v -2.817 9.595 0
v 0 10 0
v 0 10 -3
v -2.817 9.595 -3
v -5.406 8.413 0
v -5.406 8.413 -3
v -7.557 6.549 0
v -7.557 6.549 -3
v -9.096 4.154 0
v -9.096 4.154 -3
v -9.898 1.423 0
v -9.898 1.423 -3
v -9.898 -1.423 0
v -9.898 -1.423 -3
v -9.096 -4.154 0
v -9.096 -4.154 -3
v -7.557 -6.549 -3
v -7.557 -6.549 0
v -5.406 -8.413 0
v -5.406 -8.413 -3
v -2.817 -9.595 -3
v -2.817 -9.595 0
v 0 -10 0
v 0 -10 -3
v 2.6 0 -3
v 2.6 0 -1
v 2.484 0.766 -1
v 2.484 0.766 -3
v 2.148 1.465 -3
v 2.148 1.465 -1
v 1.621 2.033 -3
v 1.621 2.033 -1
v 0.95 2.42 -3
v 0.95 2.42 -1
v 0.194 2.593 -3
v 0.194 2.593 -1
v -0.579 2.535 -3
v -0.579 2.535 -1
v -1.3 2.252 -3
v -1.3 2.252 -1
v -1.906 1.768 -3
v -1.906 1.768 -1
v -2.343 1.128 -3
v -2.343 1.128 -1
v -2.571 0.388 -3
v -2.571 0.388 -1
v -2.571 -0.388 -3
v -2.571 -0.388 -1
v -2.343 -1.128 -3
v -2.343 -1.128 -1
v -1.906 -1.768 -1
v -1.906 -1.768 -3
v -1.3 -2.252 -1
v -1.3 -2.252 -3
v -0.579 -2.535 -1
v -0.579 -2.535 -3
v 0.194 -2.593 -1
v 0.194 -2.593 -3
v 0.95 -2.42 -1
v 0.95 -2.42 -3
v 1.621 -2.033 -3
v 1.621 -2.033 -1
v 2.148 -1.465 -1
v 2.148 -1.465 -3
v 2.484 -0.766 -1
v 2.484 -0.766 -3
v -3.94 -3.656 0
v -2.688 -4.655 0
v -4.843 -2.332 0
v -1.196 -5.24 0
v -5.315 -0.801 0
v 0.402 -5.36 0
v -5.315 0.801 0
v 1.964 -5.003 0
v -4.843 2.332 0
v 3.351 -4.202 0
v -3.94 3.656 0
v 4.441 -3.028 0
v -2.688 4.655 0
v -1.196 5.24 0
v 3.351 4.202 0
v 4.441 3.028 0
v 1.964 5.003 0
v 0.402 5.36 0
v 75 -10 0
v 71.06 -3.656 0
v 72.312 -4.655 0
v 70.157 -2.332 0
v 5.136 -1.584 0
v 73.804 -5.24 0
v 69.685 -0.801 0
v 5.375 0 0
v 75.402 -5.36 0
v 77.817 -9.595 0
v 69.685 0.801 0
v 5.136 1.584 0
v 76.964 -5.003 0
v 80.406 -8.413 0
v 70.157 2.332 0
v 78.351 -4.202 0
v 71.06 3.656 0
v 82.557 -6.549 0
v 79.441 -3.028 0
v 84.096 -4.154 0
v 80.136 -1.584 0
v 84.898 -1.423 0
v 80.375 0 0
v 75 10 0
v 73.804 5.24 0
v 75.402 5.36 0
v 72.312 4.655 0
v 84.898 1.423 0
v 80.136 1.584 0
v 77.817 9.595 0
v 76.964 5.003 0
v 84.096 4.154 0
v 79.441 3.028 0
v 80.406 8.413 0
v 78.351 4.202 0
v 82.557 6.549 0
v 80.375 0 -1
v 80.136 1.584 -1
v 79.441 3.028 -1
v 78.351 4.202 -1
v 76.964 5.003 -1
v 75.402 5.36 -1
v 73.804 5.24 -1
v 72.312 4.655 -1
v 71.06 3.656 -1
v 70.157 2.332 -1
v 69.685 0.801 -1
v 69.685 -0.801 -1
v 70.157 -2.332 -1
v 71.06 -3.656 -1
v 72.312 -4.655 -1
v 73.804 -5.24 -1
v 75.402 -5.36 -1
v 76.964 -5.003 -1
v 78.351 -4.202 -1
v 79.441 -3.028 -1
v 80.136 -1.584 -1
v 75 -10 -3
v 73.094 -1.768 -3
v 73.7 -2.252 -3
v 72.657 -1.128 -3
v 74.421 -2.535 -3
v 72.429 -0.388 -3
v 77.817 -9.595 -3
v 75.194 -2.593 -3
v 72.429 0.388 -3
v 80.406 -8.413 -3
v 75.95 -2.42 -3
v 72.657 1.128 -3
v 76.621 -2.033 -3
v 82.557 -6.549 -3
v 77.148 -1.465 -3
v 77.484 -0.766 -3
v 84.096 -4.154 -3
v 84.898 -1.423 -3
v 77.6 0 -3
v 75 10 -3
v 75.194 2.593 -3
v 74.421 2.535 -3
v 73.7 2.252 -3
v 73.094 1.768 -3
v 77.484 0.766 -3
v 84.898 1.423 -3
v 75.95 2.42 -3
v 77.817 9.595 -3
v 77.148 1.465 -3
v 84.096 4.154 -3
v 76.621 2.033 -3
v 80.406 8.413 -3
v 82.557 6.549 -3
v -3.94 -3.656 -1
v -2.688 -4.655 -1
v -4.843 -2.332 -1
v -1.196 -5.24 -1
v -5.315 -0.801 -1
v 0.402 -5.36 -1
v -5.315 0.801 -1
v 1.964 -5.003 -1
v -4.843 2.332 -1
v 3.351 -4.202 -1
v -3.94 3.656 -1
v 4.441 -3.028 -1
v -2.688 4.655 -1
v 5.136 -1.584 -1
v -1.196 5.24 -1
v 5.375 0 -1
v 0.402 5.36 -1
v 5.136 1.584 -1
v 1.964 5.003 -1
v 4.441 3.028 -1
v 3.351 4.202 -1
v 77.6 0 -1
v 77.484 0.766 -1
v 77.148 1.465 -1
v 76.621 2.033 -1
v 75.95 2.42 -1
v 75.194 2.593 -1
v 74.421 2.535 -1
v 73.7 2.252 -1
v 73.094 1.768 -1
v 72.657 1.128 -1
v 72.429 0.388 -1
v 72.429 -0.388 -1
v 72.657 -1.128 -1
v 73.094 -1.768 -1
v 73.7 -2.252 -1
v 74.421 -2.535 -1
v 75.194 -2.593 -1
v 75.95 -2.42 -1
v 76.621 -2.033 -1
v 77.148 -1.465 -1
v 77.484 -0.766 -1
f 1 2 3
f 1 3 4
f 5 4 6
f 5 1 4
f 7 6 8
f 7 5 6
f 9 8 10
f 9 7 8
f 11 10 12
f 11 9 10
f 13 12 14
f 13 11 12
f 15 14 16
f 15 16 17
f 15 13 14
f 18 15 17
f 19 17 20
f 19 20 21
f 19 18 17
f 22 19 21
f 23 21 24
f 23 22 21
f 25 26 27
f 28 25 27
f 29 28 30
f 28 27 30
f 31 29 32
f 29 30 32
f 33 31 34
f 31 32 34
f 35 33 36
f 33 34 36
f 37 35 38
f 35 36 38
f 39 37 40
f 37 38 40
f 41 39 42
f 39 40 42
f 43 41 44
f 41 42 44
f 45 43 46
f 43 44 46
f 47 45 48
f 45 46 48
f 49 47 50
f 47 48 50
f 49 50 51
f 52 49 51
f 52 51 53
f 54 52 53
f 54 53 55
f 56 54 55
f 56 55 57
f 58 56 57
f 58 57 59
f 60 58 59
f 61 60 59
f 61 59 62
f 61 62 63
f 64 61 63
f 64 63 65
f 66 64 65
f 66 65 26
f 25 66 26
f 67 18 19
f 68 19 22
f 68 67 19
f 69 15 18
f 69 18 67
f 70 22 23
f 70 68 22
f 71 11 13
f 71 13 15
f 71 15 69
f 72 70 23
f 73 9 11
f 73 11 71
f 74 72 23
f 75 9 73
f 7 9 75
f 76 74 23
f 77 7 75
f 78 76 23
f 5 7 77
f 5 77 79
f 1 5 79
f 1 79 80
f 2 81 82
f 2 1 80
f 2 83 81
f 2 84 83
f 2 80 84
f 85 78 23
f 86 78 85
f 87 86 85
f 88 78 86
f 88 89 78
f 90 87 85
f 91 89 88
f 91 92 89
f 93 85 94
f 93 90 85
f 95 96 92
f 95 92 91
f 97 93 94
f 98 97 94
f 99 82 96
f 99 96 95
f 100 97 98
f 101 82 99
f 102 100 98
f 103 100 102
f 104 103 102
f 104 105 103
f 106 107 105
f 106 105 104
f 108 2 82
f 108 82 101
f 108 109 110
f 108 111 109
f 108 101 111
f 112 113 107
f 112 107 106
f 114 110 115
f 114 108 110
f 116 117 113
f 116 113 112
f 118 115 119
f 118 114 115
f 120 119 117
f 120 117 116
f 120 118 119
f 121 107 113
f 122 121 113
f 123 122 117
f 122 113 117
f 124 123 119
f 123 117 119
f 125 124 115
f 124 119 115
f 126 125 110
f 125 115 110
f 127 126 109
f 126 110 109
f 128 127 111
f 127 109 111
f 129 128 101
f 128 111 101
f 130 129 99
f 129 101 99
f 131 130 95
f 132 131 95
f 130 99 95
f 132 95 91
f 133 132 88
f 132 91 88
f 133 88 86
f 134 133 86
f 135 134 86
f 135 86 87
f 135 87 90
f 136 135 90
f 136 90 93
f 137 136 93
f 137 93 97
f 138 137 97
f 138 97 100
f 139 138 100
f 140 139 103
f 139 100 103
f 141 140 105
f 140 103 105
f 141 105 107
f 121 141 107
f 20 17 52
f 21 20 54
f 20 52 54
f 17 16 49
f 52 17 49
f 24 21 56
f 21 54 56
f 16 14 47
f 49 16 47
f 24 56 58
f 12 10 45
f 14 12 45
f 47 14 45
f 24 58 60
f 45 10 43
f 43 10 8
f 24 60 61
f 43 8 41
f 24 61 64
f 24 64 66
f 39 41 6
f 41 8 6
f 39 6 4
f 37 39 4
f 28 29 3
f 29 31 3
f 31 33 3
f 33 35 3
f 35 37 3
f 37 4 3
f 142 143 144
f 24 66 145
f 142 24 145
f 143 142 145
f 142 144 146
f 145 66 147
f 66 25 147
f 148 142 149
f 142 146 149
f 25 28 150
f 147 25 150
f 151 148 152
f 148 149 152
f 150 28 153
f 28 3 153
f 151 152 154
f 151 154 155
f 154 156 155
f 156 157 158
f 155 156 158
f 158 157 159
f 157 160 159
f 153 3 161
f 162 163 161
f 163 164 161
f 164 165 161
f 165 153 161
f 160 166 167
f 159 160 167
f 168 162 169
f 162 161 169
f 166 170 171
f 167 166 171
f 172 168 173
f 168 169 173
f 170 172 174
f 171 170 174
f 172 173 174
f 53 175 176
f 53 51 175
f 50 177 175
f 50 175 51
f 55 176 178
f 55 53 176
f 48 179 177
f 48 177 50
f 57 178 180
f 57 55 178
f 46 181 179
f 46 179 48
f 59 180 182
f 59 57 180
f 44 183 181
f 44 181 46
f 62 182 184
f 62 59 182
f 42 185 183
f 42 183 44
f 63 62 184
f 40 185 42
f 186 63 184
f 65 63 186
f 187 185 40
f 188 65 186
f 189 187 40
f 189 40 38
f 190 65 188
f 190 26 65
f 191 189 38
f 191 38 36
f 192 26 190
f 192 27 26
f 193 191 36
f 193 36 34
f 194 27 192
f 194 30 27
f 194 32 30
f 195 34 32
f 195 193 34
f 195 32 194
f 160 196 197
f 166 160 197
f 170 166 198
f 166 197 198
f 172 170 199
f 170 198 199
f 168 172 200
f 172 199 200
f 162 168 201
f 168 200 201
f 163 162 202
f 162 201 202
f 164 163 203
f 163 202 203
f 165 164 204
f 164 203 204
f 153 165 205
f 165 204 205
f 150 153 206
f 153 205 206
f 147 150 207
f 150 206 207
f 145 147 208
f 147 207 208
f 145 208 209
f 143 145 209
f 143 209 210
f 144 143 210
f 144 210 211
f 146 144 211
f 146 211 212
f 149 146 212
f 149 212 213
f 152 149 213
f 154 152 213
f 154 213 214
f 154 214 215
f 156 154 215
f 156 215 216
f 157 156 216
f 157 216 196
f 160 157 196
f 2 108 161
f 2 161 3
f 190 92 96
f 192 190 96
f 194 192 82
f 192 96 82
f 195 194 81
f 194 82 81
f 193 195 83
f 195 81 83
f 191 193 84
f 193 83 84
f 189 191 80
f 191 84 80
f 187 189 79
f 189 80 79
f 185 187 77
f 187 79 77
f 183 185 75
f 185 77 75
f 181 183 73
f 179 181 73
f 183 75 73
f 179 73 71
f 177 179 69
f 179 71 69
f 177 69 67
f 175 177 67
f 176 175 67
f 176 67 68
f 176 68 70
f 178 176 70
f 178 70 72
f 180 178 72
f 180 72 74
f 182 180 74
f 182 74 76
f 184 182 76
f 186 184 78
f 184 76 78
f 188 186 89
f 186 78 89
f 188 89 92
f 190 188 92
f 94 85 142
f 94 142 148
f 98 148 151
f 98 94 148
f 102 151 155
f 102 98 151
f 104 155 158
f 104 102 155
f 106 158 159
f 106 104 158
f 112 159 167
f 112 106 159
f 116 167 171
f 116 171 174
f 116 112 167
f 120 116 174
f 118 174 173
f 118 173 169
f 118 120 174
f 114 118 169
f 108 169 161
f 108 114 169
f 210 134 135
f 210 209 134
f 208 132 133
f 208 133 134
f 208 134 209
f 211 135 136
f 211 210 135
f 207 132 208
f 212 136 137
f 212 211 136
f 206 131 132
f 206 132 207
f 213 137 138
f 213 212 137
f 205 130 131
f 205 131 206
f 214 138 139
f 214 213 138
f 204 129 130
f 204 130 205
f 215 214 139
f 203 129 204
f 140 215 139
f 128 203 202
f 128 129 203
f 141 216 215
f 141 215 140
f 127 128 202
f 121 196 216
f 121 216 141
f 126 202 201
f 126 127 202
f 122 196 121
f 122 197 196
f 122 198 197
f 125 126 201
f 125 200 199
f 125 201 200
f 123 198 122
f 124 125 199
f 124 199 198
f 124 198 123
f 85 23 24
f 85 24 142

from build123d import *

# Parameters (mm, degrees)
F0_R     = 5.375
F0_R_2   = 2.6
F1_DEPTH = 3
F2_DEPTH = 1


with BuildPart() as f1:
    # F0 (on Top) → F1 (new body)
    with BuildSketch(Plane.XY):
        with BuildLine():
            Line((75, 10), (0, 10))
            ThreePointArc((0, 10), (-10, 0), (0, -10))
            Line((0, -10), (75, -10))
            ThreePointArc((75, -10), (85, 0), (75, 10))
        make_face()
        Circle(F0_R, mode=Mode.SUBTRACT)
        with Locations((75, 0)):
            Circle(F0_R, mode=Mode.SUBTRACT)
        with Locations((75, 0)):
            Circle(F0_R)
        with Locations((75, 0)):
            Circle(F0_R_2, mode=Mode.SUBTRACT)
        Circle(F0_R)
        Circle(F0_R_2, mode=Mode.SUBTRACT)
    extrude(amount=-F1_DEPTH)

    # F0 (on Top) → F2 (cut)
    with BuildSketch(Plane.XY):
        with Locations((75, 0)):
            Circle(F0_R)
        with Locations((75, 0)):
            Circle(F0_R_2, mode=Mode.SUBTRACT)
        Circle(F0_R)
        Circle(F0_R_2, mode=Mode.SUBTRACT)
    extrude(amount=-F2_DEPTH, mode=Mode.SUBTRACT)


solid = f1.part
